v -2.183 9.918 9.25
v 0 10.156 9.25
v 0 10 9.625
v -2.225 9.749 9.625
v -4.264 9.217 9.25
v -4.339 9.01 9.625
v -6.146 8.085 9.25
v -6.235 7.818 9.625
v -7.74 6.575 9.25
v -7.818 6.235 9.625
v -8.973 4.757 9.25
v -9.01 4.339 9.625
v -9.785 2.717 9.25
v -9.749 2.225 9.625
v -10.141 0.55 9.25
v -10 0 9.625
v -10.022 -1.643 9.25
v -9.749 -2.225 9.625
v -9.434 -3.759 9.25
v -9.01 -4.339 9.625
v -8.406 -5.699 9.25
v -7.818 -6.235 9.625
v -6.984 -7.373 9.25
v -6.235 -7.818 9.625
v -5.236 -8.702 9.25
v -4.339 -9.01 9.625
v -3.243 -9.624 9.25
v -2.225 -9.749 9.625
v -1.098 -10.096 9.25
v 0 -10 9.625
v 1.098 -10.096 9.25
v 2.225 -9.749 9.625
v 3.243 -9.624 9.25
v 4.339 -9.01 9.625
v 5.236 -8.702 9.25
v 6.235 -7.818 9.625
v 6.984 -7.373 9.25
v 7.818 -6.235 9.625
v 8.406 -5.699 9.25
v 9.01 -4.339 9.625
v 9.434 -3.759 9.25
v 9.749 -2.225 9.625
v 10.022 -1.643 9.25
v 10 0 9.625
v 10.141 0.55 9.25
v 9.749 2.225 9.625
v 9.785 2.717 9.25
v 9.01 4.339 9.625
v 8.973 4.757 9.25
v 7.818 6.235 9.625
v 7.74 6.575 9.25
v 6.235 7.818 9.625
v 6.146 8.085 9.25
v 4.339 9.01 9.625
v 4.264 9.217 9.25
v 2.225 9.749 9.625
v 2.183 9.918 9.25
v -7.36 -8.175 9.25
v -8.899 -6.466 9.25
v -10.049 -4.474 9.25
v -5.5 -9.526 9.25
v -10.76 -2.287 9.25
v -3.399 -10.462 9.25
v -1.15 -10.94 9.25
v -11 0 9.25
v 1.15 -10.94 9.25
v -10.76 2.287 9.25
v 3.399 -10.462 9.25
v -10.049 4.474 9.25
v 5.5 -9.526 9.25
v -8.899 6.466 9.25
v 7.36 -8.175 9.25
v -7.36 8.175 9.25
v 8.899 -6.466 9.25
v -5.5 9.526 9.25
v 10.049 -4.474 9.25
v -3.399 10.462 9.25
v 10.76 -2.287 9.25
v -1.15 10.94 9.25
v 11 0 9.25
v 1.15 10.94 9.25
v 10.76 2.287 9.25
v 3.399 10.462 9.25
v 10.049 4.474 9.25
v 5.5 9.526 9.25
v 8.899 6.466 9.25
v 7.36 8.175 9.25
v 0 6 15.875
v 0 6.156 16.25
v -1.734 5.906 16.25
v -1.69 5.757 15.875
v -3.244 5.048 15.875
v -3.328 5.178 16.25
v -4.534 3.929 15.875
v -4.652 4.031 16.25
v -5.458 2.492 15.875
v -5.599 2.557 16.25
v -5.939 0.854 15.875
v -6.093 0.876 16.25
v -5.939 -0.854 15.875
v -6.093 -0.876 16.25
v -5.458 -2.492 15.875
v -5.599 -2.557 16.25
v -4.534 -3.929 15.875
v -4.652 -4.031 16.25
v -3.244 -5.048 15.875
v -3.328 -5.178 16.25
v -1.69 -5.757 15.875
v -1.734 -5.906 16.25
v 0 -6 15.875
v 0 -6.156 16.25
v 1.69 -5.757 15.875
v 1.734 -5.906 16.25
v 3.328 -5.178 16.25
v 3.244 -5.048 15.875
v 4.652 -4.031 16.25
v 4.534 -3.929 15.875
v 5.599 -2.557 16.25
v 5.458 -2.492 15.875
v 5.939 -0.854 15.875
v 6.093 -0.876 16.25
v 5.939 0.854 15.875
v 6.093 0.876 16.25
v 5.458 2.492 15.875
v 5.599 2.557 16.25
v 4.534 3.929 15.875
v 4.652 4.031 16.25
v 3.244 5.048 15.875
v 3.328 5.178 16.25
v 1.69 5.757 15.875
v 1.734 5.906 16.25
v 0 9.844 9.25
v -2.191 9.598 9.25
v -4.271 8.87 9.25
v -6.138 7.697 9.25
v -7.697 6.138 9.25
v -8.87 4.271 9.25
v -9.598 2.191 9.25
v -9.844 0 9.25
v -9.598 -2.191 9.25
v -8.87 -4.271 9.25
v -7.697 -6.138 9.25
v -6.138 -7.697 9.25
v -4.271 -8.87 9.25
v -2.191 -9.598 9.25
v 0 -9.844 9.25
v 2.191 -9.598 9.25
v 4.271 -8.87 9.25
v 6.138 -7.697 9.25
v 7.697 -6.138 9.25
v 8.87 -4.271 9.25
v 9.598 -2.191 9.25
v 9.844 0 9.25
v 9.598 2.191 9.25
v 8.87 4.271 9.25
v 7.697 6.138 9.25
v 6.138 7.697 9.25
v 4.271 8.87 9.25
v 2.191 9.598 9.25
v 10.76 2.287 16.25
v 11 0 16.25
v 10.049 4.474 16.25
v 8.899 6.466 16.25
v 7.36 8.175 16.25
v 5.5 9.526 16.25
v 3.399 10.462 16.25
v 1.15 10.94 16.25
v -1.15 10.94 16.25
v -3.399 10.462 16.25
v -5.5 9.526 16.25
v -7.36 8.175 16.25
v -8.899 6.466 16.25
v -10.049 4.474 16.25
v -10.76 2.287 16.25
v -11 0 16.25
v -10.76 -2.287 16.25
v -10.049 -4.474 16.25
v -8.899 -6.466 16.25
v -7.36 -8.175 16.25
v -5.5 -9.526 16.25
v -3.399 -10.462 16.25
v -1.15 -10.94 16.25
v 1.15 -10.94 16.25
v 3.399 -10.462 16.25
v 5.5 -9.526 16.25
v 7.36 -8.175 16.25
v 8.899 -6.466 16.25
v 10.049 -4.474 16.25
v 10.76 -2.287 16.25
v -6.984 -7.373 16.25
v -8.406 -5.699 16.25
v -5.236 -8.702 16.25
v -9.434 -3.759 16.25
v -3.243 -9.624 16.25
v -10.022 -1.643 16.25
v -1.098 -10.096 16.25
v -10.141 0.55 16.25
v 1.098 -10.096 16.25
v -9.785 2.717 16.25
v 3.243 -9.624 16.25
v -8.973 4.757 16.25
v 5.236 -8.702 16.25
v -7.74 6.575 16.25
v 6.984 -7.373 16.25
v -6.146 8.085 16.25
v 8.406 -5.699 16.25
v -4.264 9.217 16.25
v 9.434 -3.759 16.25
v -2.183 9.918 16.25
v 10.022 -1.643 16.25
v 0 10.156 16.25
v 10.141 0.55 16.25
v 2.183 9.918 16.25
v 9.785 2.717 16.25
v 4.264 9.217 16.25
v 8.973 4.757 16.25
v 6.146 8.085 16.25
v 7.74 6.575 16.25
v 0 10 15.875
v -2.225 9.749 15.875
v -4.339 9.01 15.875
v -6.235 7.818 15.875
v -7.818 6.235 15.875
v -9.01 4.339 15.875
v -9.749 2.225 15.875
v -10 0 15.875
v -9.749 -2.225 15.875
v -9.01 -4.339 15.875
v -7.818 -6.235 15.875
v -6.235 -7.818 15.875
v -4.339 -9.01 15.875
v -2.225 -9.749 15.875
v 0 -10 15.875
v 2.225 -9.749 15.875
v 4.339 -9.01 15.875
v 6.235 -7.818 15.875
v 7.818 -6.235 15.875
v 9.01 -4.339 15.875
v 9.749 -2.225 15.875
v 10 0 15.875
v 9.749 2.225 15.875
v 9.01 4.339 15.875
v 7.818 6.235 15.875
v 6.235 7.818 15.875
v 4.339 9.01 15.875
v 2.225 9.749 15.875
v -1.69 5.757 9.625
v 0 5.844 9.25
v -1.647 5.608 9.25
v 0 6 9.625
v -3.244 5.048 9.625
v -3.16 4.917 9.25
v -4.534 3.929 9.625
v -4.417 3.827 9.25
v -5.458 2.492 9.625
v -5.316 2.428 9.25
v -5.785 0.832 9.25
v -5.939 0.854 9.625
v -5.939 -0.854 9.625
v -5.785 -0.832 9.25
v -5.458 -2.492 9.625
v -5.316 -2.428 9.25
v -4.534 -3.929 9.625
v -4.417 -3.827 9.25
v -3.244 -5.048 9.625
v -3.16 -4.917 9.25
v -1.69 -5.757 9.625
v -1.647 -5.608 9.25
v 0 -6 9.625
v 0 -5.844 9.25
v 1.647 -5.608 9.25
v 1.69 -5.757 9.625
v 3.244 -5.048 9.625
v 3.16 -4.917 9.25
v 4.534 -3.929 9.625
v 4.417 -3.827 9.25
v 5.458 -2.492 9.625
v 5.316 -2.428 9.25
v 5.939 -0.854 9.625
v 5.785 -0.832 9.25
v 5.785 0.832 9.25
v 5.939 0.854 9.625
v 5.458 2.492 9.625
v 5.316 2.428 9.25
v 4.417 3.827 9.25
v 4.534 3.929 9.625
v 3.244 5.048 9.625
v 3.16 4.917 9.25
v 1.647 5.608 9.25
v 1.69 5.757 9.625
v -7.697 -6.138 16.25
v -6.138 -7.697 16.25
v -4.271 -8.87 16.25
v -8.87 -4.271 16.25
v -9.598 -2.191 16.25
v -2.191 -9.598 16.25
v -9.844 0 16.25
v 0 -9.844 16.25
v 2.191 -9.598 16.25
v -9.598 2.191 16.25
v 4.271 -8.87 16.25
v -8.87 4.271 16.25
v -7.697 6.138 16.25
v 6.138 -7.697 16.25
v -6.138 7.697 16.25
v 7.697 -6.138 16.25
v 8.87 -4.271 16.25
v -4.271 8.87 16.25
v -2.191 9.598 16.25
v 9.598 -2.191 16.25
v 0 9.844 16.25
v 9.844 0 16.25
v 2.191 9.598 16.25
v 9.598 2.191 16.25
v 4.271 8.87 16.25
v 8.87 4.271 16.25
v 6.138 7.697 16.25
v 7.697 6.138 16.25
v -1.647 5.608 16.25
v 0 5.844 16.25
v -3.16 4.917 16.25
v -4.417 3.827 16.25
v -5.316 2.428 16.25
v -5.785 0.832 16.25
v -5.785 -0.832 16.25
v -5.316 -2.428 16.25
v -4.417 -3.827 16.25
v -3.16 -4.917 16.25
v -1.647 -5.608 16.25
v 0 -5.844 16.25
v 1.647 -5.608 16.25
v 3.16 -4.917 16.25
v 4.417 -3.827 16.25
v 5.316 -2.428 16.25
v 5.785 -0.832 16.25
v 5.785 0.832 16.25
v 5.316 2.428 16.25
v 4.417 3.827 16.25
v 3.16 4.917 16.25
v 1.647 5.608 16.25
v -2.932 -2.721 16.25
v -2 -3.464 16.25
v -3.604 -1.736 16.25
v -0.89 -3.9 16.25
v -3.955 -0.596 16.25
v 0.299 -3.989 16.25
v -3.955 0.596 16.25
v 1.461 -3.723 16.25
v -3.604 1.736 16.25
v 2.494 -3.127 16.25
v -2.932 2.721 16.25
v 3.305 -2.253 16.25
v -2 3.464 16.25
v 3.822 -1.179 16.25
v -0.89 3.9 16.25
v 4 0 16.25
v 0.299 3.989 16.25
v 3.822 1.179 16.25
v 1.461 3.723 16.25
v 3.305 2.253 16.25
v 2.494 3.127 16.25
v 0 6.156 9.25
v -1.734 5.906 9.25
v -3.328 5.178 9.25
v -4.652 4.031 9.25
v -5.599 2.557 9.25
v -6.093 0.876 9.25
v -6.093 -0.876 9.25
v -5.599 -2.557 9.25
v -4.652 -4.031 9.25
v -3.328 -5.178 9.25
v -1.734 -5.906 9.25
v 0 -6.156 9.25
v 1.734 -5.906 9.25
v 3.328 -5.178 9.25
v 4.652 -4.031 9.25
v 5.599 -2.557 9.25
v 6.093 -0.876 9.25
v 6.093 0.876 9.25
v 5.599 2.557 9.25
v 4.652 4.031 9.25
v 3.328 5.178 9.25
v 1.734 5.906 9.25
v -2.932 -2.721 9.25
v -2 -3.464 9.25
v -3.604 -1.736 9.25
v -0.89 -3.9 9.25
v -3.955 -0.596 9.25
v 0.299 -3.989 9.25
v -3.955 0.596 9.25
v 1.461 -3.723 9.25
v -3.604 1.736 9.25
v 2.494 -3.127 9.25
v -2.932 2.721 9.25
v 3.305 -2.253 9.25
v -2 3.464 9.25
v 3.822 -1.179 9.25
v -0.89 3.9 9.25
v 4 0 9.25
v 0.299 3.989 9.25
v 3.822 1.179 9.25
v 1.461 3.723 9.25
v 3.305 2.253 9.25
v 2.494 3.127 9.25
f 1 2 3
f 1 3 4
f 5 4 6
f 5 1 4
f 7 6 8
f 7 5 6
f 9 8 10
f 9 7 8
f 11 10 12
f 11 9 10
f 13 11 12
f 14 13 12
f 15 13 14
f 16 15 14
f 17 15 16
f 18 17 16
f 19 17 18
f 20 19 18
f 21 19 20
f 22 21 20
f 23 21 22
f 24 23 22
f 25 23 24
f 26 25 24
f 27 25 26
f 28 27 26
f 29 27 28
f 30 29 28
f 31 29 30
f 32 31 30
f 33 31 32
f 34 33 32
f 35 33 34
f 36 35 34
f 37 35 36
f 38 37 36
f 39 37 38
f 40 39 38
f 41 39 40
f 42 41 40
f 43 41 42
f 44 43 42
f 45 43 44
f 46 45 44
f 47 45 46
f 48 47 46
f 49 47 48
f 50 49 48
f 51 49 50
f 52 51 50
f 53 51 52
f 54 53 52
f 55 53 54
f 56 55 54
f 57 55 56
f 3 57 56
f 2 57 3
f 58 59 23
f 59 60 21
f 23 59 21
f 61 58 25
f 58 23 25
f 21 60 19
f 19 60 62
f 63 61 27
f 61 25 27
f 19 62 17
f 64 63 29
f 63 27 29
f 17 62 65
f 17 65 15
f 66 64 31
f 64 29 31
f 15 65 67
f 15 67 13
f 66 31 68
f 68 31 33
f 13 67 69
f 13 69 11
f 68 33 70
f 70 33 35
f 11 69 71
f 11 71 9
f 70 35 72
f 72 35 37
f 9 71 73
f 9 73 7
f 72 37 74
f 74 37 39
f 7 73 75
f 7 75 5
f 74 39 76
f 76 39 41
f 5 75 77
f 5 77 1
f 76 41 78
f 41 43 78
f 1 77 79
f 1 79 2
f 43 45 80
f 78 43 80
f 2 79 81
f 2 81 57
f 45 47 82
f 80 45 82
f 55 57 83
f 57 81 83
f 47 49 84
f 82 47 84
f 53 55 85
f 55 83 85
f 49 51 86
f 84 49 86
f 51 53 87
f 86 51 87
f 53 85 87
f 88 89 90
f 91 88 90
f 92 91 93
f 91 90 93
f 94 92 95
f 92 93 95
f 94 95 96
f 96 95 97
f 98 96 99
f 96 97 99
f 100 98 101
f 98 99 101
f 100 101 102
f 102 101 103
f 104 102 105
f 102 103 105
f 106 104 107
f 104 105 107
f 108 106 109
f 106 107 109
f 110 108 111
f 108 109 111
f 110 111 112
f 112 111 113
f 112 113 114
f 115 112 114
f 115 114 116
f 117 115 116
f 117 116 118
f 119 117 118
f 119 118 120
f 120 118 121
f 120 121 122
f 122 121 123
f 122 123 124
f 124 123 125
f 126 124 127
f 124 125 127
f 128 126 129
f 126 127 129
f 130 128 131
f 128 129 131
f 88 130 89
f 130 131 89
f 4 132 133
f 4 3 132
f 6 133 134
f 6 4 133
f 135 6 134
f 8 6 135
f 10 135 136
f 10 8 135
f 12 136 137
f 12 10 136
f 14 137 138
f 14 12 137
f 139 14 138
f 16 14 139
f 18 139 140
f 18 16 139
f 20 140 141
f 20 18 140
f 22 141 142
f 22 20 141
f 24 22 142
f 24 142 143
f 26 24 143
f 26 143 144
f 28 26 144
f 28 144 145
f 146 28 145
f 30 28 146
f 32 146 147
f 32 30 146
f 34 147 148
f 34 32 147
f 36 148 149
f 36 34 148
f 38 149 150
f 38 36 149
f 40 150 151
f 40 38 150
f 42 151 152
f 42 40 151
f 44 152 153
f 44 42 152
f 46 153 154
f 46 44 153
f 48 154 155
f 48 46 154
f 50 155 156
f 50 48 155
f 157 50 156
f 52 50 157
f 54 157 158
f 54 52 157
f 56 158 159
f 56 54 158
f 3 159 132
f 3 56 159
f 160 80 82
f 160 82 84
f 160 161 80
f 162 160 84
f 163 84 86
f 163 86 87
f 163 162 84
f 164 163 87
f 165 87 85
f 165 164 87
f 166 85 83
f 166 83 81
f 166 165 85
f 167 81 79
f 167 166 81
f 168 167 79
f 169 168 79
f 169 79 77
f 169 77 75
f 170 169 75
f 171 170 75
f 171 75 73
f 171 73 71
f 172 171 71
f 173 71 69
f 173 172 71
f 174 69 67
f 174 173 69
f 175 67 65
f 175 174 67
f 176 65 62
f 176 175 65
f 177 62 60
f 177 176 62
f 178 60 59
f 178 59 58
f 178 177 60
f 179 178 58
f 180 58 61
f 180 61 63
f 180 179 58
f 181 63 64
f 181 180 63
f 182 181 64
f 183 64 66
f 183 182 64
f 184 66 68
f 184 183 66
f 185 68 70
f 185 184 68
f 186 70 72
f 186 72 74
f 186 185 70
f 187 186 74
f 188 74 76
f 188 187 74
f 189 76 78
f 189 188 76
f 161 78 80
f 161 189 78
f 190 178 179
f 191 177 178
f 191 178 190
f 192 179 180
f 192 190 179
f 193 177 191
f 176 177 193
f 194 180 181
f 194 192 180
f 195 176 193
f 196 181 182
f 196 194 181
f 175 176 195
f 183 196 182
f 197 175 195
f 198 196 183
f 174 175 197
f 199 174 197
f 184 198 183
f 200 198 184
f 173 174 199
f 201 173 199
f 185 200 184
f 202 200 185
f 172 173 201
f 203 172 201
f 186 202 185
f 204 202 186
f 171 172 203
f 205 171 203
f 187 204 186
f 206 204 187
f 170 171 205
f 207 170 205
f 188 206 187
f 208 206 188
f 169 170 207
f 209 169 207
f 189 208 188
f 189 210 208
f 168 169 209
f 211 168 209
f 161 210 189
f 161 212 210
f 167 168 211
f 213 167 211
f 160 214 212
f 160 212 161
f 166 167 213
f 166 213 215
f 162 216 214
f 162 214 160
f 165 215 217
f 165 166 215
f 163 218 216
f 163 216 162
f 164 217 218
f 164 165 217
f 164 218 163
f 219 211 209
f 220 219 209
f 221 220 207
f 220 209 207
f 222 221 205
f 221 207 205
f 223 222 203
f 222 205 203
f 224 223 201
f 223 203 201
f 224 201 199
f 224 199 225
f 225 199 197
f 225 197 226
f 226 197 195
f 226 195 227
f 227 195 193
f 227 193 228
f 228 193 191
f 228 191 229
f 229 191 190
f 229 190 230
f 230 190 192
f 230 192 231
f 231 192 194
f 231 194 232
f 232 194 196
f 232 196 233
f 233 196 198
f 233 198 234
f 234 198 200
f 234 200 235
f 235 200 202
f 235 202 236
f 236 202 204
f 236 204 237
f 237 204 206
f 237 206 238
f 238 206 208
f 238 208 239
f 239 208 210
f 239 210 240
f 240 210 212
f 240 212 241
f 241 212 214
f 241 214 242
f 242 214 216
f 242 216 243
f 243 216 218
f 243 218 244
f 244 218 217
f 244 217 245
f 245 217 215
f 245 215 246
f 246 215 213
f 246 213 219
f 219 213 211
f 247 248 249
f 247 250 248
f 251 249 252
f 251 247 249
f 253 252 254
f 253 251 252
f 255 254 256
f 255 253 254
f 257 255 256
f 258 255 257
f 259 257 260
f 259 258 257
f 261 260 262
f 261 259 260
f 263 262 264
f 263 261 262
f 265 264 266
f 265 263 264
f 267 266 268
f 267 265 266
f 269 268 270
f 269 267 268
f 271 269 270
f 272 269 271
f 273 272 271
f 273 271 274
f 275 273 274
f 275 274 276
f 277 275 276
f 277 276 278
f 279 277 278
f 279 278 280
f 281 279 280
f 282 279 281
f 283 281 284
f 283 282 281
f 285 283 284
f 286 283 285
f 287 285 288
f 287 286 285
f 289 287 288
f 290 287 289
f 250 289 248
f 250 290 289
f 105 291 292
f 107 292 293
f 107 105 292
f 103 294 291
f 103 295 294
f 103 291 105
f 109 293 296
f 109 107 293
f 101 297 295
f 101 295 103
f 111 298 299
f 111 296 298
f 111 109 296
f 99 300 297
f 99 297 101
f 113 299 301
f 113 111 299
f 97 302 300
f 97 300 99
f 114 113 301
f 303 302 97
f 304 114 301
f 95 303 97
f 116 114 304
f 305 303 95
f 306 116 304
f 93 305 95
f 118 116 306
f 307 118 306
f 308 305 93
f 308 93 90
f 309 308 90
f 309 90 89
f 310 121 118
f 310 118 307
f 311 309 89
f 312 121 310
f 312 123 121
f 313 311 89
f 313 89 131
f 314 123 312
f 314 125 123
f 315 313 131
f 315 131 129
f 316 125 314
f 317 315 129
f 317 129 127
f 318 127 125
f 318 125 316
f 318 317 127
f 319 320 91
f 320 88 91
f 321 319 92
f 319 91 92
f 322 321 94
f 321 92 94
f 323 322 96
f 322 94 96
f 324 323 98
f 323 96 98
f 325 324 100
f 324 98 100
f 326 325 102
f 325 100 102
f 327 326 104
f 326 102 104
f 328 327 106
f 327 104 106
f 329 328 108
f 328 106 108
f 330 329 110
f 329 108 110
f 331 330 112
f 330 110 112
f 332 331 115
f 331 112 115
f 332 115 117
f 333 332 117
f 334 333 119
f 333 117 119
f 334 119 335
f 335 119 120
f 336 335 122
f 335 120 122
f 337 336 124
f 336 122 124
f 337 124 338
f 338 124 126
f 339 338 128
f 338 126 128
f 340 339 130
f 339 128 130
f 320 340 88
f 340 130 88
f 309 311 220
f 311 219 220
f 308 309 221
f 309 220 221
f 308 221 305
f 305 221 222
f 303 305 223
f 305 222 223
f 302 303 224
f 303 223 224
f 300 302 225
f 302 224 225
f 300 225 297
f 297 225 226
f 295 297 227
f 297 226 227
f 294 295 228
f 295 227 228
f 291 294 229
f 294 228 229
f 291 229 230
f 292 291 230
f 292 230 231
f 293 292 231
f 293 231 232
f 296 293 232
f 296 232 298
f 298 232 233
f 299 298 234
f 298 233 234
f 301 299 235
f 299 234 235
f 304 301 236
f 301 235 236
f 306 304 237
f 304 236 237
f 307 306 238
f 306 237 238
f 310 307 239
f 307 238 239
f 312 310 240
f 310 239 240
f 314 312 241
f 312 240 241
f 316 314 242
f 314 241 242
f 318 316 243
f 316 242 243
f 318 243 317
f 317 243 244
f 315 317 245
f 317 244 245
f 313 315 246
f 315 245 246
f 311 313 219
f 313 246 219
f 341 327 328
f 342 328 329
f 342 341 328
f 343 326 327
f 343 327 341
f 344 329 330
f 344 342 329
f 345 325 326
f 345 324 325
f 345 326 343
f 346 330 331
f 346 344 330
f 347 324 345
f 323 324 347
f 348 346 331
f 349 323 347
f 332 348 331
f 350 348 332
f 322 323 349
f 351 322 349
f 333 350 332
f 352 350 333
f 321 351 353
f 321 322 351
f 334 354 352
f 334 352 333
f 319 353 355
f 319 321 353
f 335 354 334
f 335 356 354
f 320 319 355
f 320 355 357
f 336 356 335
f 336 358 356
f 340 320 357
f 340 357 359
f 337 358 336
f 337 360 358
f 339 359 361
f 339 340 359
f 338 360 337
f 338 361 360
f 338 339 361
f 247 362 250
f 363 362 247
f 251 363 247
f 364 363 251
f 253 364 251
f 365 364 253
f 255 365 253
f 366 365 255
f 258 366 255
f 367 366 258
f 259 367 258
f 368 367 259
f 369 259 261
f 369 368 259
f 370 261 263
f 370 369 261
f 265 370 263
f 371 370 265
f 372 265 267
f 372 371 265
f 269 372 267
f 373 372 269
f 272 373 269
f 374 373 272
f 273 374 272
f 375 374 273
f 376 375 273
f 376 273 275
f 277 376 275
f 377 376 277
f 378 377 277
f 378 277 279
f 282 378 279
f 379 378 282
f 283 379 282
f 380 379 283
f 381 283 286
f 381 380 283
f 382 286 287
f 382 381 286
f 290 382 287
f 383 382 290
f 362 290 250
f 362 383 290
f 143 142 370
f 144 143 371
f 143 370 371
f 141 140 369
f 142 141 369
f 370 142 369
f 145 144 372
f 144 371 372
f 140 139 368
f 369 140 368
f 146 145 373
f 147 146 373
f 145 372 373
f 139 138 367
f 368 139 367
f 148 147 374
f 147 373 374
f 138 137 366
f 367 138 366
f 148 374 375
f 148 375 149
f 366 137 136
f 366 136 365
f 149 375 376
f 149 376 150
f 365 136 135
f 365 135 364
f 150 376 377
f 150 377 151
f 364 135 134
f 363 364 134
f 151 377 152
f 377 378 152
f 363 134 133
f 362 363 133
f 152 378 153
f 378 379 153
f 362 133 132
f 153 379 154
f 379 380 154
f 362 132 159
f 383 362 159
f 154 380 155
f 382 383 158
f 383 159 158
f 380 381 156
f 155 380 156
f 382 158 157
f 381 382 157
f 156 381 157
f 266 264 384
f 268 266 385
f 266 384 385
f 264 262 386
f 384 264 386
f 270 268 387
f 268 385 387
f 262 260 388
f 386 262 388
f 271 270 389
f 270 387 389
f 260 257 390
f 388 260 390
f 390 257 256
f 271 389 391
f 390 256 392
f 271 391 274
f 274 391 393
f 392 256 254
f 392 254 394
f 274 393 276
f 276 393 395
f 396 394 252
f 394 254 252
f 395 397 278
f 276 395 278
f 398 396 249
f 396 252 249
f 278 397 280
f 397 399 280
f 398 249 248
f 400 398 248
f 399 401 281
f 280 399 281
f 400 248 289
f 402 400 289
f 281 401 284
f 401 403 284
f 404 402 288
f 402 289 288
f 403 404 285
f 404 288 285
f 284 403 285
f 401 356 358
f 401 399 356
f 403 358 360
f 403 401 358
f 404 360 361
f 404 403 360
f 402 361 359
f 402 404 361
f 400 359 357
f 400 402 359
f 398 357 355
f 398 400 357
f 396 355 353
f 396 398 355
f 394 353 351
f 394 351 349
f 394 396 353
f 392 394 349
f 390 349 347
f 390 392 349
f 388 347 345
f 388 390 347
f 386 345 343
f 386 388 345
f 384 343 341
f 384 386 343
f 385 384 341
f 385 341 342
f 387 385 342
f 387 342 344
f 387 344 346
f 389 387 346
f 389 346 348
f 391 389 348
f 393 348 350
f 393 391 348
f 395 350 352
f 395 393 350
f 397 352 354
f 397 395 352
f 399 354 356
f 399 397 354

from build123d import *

# Parameters (mm, degrees)
SKETCH002_R   = 11
SKETCH002_R_2 = 4
PAD002_DEPTH  = 3.5


with BuildPart() as part:
    # Sketch002 → Pad002 (new body, symmetric)
    with BuildSketch(Plane.XY):
        Circle(SKETCH002_R)
        Circle(SKETCH002_R_2, mode=Mode.SUBTRACT)
    extrude(amount=PAD002_DEPTH, both=True)

    # Sketch003 → Groove (revolve, cut)
    with BuildSketch(Plane.YZ):
        Polygon((3.265378, -9.726486), (6, -3.124525), (6.615998, -4.611675), (9.384002, -4.611675), (10, -3.124525), (10.963347, -5.45025), (14.375534, -9.430194), (8.874444, -10.64642), align=None)
    groove = revolve(axis=Axis((0, 0, 0), (0, 0, 1)), mode=Mode.SUBTRACT)

    # Mirrored: Groove across XY
    add(groove.mirror(Plane.XY), mode=Mode.SUBTRACT)


with BuildPart() as part_1:
    # Body001 placement: moved
    add(part.part.moved(Location((0, 0, 12.75))))


solid = part_1.part
